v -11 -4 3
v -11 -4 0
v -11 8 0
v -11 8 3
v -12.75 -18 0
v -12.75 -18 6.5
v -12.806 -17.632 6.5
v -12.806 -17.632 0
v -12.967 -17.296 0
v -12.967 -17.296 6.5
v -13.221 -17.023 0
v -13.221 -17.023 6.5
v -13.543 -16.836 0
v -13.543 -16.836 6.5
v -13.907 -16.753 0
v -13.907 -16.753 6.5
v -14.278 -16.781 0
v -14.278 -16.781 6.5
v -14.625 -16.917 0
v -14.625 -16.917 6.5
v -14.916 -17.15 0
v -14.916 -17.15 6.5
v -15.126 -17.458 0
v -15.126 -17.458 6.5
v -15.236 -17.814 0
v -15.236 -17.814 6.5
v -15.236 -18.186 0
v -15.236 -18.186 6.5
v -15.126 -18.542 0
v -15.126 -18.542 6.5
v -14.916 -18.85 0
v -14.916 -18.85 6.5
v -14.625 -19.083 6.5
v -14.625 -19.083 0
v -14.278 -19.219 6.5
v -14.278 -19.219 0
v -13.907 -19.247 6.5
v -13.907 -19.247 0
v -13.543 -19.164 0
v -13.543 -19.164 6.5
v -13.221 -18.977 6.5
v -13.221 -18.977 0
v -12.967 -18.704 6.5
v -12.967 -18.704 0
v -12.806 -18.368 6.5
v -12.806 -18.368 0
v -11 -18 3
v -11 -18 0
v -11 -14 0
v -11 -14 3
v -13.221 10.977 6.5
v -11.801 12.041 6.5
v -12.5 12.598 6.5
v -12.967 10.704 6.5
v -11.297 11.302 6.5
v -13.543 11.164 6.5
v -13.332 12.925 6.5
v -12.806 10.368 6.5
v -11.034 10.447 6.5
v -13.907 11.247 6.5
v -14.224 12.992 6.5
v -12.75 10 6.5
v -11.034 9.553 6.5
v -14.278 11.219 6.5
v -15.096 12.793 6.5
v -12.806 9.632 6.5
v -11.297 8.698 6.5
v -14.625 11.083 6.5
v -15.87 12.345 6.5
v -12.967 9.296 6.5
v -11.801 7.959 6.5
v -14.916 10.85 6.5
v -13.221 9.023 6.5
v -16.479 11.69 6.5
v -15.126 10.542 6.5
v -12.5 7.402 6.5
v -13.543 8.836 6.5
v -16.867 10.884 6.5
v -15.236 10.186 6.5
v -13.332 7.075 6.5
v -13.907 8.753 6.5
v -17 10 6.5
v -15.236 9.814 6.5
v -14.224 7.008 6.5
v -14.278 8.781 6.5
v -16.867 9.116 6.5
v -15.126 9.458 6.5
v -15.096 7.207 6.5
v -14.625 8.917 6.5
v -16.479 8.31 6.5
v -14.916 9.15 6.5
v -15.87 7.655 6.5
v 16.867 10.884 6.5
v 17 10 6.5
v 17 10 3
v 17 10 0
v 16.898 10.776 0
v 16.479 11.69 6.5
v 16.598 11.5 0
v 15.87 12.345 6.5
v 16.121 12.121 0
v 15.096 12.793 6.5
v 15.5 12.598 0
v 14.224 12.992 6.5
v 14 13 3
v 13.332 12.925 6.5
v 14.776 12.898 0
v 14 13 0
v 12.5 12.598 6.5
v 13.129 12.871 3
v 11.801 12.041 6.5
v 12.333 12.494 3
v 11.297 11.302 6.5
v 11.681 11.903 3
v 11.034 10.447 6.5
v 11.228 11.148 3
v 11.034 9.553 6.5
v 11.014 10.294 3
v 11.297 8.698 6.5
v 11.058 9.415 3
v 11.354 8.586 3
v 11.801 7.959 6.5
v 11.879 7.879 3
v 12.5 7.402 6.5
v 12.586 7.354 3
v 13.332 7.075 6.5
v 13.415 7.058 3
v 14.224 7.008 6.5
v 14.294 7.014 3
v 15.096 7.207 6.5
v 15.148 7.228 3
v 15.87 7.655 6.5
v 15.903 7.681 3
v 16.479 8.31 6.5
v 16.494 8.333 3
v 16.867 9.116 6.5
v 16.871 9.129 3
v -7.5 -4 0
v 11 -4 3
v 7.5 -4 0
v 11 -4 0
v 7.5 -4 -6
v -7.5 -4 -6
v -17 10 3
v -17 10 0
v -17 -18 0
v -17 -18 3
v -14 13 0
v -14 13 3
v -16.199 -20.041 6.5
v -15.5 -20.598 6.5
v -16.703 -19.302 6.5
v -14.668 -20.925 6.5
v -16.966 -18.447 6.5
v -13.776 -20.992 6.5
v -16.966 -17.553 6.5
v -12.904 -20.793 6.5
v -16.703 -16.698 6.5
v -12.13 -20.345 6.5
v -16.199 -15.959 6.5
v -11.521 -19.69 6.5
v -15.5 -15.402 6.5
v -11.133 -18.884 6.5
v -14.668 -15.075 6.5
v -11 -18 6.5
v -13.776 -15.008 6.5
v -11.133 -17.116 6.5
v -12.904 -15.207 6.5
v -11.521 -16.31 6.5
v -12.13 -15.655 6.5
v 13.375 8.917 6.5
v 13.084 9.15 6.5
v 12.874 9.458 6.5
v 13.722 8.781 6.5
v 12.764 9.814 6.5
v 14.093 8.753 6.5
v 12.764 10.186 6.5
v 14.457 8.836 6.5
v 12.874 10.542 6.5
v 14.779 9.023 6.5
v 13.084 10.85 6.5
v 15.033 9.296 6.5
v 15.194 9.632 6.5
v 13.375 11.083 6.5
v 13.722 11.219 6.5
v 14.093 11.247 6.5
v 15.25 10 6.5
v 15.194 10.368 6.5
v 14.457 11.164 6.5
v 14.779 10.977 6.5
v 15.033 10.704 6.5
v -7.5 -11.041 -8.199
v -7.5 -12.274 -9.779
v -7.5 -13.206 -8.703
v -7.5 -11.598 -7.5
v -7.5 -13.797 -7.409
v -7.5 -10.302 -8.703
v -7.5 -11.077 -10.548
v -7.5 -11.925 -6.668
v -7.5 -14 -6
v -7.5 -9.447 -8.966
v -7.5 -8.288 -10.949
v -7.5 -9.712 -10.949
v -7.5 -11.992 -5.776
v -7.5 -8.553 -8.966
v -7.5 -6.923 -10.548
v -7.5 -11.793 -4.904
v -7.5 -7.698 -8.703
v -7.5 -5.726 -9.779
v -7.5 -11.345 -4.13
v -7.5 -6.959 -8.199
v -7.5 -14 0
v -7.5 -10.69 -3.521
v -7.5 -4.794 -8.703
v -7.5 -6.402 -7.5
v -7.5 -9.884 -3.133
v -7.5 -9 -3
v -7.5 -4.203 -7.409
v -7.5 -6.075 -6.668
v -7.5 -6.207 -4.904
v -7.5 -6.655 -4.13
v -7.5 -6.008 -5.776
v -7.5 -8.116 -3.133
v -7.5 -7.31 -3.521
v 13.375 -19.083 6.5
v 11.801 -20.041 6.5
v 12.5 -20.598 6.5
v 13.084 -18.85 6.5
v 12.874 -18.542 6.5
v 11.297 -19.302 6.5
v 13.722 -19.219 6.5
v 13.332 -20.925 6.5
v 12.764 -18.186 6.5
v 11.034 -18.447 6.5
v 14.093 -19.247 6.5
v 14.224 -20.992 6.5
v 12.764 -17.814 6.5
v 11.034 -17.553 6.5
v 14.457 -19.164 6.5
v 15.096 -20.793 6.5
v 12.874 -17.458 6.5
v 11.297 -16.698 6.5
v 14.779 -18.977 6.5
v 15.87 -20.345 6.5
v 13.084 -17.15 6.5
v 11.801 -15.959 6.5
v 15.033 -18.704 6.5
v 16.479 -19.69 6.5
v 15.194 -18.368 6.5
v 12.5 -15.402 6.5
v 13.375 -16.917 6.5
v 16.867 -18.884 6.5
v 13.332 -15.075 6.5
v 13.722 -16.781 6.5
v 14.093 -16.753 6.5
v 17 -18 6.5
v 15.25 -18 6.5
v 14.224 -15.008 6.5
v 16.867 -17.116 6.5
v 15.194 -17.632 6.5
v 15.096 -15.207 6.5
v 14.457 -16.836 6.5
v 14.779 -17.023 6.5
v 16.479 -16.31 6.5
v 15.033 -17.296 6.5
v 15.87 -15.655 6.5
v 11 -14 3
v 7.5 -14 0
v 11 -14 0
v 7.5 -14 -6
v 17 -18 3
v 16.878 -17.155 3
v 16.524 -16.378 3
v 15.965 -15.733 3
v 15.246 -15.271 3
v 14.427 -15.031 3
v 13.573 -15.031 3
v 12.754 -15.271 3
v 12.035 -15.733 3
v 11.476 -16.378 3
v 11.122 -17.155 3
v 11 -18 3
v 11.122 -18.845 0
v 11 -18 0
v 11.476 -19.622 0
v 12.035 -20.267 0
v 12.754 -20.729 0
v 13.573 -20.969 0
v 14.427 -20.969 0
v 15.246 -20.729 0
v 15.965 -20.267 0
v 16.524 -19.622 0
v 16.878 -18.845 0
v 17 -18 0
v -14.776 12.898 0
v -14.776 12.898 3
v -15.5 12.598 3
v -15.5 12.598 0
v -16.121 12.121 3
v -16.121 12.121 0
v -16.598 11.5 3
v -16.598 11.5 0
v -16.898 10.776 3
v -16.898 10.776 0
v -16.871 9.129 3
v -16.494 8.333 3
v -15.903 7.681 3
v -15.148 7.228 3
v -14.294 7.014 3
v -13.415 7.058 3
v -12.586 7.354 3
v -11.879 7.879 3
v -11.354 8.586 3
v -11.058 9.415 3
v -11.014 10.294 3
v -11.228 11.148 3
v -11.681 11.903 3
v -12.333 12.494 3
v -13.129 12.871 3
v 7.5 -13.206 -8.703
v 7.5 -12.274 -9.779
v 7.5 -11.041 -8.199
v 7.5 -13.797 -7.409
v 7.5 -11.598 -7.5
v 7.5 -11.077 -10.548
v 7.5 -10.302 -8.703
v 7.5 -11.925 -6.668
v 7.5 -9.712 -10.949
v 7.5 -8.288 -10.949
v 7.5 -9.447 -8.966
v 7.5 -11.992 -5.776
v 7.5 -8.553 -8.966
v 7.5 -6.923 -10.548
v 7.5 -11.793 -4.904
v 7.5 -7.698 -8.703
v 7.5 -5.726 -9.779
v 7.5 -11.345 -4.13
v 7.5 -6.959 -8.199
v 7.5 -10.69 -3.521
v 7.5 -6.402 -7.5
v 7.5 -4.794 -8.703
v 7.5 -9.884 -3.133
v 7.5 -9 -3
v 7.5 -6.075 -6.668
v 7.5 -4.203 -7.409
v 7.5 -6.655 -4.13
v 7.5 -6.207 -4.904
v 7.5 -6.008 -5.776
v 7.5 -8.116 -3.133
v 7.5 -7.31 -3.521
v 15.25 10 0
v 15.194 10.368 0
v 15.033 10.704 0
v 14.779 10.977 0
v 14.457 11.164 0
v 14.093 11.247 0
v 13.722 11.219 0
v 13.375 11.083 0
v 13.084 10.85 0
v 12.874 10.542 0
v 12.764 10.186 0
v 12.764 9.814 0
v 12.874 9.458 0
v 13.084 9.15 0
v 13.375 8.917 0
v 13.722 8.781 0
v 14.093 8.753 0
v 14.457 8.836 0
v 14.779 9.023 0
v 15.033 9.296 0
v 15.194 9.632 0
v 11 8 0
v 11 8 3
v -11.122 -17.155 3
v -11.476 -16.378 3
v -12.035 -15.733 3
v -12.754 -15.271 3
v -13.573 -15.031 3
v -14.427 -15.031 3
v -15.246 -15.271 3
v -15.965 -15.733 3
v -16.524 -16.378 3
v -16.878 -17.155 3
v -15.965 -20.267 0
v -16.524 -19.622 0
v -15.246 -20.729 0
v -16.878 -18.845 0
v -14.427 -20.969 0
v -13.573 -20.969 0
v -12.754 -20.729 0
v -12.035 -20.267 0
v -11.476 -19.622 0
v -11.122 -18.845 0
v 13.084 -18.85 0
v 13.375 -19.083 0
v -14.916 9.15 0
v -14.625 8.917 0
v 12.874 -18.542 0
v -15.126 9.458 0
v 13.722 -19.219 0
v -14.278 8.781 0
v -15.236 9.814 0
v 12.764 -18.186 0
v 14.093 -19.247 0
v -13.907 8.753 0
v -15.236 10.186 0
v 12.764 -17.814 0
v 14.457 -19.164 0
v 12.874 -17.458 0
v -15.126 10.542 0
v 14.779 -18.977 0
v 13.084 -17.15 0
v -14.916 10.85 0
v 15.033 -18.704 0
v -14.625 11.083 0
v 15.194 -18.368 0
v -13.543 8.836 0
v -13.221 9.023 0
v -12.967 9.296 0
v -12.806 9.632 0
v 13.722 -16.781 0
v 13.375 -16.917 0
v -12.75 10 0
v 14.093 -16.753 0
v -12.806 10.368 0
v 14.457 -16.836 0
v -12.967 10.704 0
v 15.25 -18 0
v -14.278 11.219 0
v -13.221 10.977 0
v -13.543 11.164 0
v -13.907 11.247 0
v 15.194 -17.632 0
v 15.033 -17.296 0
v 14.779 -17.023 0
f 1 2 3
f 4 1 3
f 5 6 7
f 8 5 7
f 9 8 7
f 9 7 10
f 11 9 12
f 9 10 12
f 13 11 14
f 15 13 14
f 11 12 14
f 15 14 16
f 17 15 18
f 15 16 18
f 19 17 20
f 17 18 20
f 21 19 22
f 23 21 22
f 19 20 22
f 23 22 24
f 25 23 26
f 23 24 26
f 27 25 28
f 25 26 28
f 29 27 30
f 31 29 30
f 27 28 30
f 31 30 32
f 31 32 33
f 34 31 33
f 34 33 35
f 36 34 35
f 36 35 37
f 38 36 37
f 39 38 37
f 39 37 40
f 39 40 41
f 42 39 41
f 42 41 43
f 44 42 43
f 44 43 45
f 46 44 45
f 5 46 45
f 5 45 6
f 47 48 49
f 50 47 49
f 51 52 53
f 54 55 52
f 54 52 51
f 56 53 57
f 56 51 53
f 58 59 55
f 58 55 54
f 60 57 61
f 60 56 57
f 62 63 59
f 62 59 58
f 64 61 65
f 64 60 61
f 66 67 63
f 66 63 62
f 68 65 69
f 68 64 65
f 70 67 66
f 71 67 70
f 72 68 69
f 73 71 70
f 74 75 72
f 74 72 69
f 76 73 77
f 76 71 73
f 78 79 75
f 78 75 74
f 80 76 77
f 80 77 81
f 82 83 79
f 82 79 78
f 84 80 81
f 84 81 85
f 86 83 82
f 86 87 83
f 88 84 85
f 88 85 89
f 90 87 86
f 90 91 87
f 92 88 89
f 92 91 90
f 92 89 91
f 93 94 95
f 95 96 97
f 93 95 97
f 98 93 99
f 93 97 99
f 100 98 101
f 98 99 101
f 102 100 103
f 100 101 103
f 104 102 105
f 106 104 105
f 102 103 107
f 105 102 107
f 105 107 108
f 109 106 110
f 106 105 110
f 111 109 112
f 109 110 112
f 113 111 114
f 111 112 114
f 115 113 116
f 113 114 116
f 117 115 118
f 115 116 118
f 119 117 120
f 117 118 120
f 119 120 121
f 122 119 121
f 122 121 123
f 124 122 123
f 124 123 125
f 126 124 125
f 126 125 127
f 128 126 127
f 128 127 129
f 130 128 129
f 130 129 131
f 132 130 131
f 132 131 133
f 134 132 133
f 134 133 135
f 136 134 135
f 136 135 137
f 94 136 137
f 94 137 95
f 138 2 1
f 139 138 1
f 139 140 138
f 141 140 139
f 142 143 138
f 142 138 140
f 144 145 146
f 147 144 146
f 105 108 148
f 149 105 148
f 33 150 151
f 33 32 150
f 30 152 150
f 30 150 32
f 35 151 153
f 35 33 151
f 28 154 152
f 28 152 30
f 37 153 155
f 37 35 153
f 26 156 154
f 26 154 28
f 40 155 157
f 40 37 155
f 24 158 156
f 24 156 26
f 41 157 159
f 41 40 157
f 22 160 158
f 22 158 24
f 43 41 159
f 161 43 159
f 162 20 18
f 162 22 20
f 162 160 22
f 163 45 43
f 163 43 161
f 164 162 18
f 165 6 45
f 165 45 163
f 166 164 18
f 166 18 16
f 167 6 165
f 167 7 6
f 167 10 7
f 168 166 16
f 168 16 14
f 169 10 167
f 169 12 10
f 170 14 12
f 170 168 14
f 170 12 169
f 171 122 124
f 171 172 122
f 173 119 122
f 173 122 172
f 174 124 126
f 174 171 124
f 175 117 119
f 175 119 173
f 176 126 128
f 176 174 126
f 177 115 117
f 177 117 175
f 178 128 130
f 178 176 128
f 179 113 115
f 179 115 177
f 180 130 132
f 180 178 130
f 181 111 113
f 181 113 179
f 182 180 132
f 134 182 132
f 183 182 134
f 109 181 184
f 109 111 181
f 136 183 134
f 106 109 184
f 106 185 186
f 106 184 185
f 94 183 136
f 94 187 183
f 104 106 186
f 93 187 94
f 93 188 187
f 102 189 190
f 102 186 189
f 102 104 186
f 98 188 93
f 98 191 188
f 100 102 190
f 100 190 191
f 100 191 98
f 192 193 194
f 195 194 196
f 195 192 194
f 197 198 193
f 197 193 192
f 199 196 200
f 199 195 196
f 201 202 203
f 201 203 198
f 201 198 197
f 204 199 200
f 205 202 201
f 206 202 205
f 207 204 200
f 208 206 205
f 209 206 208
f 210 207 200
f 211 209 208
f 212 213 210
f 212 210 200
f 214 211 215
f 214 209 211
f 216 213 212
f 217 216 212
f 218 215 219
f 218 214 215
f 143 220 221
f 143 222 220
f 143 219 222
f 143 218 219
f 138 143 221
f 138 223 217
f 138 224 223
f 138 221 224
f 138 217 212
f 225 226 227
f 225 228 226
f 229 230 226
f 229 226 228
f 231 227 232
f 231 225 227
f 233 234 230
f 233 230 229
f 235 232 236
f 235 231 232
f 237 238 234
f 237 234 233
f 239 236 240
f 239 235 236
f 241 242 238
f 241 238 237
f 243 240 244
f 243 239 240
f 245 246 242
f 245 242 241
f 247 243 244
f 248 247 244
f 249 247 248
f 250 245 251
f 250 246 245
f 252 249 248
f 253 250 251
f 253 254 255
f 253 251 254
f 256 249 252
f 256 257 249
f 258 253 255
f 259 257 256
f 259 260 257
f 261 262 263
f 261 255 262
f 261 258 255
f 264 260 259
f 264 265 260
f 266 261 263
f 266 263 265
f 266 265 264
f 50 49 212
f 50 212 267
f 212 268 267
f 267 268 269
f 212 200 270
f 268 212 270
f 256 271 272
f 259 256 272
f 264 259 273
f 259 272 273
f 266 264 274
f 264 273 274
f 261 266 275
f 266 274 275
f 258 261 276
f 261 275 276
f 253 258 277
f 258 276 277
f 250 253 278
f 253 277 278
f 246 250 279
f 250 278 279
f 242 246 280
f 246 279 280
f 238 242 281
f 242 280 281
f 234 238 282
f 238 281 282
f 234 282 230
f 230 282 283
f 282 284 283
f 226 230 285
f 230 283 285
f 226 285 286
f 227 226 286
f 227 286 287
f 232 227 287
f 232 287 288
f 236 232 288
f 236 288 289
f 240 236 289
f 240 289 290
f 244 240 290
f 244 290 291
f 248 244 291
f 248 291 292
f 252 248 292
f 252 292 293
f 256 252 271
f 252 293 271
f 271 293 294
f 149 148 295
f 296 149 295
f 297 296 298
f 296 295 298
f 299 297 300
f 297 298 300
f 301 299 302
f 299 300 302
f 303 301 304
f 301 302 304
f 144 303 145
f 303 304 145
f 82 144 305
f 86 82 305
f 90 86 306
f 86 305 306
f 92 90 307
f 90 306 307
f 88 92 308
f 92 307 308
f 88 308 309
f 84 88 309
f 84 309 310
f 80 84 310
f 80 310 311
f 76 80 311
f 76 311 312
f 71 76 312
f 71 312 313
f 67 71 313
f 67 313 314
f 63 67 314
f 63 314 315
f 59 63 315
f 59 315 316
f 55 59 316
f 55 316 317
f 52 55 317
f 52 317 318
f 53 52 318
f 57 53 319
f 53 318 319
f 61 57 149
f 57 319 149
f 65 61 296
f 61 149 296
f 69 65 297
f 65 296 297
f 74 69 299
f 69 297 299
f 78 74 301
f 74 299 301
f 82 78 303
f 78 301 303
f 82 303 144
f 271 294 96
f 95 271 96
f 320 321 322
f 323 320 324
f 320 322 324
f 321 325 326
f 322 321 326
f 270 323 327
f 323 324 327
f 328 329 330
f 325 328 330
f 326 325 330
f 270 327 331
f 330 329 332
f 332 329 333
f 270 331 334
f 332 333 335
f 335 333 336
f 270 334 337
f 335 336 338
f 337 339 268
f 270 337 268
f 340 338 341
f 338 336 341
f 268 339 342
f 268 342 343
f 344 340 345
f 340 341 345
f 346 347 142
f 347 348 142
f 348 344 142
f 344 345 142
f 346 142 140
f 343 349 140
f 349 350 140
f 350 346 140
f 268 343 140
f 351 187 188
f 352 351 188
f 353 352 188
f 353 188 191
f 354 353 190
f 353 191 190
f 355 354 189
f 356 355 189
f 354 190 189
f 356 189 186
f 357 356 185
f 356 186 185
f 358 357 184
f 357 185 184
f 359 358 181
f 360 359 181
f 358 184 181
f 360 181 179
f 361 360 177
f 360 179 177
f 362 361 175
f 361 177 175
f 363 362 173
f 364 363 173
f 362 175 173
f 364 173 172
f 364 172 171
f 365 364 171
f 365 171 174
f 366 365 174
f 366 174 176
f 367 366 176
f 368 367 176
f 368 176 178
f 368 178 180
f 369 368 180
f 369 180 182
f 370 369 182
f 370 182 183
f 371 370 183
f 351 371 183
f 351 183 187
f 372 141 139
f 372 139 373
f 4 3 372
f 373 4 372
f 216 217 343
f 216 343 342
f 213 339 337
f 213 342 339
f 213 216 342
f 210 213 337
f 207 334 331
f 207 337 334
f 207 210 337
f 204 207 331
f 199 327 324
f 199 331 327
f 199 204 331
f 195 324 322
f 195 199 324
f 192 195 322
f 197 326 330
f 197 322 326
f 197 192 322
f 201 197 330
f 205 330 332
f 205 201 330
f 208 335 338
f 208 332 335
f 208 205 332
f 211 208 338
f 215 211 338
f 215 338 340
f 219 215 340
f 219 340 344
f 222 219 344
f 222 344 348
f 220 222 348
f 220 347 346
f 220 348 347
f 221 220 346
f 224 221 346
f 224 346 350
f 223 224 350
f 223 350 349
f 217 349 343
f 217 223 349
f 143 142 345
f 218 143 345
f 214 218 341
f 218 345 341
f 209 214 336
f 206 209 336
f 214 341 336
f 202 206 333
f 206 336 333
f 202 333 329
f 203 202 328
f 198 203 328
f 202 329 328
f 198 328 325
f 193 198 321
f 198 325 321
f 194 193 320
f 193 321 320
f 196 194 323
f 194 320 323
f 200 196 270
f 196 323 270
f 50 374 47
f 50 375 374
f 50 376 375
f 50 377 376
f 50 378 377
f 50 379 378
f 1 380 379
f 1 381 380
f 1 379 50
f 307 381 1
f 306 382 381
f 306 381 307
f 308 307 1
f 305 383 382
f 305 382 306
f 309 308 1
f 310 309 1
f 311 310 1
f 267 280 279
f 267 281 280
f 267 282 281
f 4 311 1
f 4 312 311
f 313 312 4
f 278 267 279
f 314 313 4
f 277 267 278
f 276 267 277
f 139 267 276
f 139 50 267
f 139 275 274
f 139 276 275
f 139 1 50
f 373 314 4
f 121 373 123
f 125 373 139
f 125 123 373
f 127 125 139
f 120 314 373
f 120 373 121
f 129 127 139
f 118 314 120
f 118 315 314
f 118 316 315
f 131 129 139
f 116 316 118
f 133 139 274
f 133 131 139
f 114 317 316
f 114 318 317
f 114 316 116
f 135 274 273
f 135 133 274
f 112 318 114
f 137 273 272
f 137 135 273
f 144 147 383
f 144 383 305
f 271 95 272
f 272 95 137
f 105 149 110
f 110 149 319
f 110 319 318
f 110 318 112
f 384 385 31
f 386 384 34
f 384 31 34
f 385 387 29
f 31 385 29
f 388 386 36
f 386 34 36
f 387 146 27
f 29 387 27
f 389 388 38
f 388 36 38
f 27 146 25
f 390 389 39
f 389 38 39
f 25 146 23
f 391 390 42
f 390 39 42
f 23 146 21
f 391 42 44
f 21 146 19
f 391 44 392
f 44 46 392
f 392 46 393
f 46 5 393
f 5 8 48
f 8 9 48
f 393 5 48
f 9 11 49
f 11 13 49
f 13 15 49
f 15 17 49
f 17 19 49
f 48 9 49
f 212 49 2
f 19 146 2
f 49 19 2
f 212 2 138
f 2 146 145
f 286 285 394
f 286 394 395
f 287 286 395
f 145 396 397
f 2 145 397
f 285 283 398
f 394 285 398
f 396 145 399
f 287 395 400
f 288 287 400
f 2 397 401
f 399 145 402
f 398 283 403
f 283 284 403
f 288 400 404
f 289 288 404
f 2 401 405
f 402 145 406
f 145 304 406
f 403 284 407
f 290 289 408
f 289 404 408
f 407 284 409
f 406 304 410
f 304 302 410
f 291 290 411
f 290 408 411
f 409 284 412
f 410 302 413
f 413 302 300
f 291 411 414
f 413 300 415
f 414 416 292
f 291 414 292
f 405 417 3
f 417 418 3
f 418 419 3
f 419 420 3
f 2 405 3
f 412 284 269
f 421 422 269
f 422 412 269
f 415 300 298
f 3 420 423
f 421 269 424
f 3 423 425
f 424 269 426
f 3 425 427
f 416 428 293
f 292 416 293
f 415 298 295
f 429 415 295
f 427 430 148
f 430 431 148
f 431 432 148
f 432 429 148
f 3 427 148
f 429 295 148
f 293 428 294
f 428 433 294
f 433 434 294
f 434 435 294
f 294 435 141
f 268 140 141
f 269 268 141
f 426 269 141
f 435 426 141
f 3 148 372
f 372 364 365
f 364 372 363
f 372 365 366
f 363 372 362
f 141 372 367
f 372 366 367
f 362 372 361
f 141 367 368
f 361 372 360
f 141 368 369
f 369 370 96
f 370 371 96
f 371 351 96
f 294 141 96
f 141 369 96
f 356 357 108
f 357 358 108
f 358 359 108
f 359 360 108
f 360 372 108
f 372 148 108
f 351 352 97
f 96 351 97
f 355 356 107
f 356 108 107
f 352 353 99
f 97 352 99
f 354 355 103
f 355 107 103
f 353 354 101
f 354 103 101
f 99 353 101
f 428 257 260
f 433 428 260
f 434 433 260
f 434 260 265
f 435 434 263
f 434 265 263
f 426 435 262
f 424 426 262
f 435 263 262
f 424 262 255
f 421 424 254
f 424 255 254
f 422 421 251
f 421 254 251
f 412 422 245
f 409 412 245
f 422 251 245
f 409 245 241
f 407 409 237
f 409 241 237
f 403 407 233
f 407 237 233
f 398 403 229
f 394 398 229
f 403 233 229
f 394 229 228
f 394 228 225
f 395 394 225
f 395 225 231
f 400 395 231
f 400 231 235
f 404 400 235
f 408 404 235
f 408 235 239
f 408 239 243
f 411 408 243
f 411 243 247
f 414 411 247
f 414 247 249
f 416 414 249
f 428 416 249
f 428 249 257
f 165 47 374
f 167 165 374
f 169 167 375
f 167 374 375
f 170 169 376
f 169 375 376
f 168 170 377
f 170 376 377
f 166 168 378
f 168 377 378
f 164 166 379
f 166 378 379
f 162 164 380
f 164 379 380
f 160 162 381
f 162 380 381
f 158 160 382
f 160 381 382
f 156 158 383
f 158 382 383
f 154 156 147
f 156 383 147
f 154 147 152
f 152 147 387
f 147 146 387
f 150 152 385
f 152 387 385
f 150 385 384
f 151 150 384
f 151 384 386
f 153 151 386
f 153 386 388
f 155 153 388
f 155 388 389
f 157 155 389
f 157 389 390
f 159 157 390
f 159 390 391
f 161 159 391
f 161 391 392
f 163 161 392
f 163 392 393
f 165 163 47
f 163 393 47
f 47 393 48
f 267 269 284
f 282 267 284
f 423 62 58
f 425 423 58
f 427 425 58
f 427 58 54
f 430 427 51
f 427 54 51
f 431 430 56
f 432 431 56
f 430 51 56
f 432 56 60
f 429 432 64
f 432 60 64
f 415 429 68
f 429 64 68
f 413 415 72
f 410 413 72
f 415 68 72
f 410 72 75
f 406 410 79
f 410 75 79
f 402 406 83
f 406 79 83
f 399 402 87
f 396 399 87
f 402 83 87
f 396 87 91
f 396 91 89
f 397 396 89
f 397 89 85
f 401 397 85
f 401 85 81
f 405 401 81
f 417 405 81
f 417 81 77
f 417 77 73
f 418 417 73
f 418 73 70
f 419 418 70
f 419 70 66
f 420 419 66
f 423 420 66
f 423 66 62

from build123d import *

# Parameters (mm, degrees)
ESQUISSE1_W                  = 22
ESQUISSE1_H                  = 12
BOSS_EXTRU_1_DEPTH           = 3
ESQUISSE3_R                  = 3
BOSS_EXTRU_3_DEPTH           = 3.5
ESQUISSE4_R                  = 1.25
ENL_V_MAT_EXTRU_1_DEPTH      = 28.789386463
BOSS_EXTRU_4_DEPTH           = 7.5
ENL_V_MAT_EXTRU_2_DEPTH      = 30.171904292
ENL_V_MAT_EXTRU_2_DEPTH_BACK = 30.171904292
ESQUISSE6_R                  = 3


with BuildPart() as part:
    # Esquisse1 → Boss.-Extru.1 (new body)
    with BuildSketch(Plane.XY):
        with BuildLine():
            Line((-17, -14), (-17, -18))
            ThreePointArc((-17, -18), (-14, -21), (-11, -18))
            Line((-11, -18), (-11, -14))
            Line((-11, -14), (11, -14))
            Line((11, -14), (11, -18))
            ThreePointArc((11, -18), (14, -21), (17, -18))
            Line((17, -18), (17, -14))
            Line((17, -14), (17, 10))
            ThreePointArc((17, 10), (16.121320344, 12.121320344), (14, 13))
            Line((14, 13), (-14, 13))
            ThreePointArc((-14, 13), (-16.121320344, 12.121320344), (-17, 10))
            Line((-17, 10), (-17, -14))
        make_face()
        with Locations((0, 2)):
            Rectangle(ESQUISSE1_W, ESQUISSE1_H, mode=Mode.SUBTRACT)
    extrude(amount=BOSS_EXTRU_1_DEPTH)

    # Esquisse3 → Boss.-Extru.3 (add)
    with BuildSketch(Plane.XY.offset(3)):
        with Locations((14, 10)):
            Circle(ESQUISSE3_R)
        with Locations(Location((-14, 10, 0), (0, 0, 180))):
            Circle(ESQUISSE3_R)
        with Locations((-14, -18)):
            Circle(ESQUISSE3_R)
        with Locations((14, -18)):
            Circle(ESQUISSE3_R)
    extrude(amount=BOSS_EXTRU_3_DEPTH)

    # Esquisse4 → Enlèv. mat.-Extru.1 (cut, through all)
    with BuildSketch(Plane.XY.offset(6.5)):
        with Locations((-14, 10)):
            Circle(ESQUISSE4_R)
        with Locations((14, 10)):
            Circle(ESQUISSE4_R)
        with Locations((-14, -18)):
            Circle(ESQUISSE4_R)
        with Locations((14, -18)):
            Circle(ESQUISSE4_R)
    extrude(amount=-ENL_V_MAT_EXTRU_1_DEPTH, mode=Mode.SUBTRACT)

    # Esquisse5 → Boss.-Extru.4 (add, symmetric)
    with BuildSketch(Plane(origin=(0, 0, 0), x_dir=(0, 0, -1), z_dir=(1, 0, 0))):
        with BuildLine():
            Line((6, -14), (0, -14))
            Line((0, -14), (0, -4))
            Line((0, -4), (6, -4))
            ThreePointArc((6, -4), (11, -9), (6, -14))
        make_face()
    extrude(amount=BOSS_EXTRU_4_DEPTH, both=True)

    # Esquisse6 → Enlèv. mat.-Extru.2 (cut, two sides: drawn at the far end of the back side and taken through both)
    with BuildSketch(Plane(origin=(0, 0, 0), x_dir=(0, 0, -1), z_dir=(1, 0, 0)).offset(-ENL_V_MAT_EXTRU_2_DEPTH_BACK)):
        with Locations(Location((6, -9, 0), (0, 0, 180))):
            Circle(ESQUISSE6_R)
    extrude(amount=ENL_V_MAT_EXTRU_2_DEPTH + ENL_V_MAT_EXTRU_2_DEPTH_BACK, mode=Mode.SUBTRACT)


solid = part.part
